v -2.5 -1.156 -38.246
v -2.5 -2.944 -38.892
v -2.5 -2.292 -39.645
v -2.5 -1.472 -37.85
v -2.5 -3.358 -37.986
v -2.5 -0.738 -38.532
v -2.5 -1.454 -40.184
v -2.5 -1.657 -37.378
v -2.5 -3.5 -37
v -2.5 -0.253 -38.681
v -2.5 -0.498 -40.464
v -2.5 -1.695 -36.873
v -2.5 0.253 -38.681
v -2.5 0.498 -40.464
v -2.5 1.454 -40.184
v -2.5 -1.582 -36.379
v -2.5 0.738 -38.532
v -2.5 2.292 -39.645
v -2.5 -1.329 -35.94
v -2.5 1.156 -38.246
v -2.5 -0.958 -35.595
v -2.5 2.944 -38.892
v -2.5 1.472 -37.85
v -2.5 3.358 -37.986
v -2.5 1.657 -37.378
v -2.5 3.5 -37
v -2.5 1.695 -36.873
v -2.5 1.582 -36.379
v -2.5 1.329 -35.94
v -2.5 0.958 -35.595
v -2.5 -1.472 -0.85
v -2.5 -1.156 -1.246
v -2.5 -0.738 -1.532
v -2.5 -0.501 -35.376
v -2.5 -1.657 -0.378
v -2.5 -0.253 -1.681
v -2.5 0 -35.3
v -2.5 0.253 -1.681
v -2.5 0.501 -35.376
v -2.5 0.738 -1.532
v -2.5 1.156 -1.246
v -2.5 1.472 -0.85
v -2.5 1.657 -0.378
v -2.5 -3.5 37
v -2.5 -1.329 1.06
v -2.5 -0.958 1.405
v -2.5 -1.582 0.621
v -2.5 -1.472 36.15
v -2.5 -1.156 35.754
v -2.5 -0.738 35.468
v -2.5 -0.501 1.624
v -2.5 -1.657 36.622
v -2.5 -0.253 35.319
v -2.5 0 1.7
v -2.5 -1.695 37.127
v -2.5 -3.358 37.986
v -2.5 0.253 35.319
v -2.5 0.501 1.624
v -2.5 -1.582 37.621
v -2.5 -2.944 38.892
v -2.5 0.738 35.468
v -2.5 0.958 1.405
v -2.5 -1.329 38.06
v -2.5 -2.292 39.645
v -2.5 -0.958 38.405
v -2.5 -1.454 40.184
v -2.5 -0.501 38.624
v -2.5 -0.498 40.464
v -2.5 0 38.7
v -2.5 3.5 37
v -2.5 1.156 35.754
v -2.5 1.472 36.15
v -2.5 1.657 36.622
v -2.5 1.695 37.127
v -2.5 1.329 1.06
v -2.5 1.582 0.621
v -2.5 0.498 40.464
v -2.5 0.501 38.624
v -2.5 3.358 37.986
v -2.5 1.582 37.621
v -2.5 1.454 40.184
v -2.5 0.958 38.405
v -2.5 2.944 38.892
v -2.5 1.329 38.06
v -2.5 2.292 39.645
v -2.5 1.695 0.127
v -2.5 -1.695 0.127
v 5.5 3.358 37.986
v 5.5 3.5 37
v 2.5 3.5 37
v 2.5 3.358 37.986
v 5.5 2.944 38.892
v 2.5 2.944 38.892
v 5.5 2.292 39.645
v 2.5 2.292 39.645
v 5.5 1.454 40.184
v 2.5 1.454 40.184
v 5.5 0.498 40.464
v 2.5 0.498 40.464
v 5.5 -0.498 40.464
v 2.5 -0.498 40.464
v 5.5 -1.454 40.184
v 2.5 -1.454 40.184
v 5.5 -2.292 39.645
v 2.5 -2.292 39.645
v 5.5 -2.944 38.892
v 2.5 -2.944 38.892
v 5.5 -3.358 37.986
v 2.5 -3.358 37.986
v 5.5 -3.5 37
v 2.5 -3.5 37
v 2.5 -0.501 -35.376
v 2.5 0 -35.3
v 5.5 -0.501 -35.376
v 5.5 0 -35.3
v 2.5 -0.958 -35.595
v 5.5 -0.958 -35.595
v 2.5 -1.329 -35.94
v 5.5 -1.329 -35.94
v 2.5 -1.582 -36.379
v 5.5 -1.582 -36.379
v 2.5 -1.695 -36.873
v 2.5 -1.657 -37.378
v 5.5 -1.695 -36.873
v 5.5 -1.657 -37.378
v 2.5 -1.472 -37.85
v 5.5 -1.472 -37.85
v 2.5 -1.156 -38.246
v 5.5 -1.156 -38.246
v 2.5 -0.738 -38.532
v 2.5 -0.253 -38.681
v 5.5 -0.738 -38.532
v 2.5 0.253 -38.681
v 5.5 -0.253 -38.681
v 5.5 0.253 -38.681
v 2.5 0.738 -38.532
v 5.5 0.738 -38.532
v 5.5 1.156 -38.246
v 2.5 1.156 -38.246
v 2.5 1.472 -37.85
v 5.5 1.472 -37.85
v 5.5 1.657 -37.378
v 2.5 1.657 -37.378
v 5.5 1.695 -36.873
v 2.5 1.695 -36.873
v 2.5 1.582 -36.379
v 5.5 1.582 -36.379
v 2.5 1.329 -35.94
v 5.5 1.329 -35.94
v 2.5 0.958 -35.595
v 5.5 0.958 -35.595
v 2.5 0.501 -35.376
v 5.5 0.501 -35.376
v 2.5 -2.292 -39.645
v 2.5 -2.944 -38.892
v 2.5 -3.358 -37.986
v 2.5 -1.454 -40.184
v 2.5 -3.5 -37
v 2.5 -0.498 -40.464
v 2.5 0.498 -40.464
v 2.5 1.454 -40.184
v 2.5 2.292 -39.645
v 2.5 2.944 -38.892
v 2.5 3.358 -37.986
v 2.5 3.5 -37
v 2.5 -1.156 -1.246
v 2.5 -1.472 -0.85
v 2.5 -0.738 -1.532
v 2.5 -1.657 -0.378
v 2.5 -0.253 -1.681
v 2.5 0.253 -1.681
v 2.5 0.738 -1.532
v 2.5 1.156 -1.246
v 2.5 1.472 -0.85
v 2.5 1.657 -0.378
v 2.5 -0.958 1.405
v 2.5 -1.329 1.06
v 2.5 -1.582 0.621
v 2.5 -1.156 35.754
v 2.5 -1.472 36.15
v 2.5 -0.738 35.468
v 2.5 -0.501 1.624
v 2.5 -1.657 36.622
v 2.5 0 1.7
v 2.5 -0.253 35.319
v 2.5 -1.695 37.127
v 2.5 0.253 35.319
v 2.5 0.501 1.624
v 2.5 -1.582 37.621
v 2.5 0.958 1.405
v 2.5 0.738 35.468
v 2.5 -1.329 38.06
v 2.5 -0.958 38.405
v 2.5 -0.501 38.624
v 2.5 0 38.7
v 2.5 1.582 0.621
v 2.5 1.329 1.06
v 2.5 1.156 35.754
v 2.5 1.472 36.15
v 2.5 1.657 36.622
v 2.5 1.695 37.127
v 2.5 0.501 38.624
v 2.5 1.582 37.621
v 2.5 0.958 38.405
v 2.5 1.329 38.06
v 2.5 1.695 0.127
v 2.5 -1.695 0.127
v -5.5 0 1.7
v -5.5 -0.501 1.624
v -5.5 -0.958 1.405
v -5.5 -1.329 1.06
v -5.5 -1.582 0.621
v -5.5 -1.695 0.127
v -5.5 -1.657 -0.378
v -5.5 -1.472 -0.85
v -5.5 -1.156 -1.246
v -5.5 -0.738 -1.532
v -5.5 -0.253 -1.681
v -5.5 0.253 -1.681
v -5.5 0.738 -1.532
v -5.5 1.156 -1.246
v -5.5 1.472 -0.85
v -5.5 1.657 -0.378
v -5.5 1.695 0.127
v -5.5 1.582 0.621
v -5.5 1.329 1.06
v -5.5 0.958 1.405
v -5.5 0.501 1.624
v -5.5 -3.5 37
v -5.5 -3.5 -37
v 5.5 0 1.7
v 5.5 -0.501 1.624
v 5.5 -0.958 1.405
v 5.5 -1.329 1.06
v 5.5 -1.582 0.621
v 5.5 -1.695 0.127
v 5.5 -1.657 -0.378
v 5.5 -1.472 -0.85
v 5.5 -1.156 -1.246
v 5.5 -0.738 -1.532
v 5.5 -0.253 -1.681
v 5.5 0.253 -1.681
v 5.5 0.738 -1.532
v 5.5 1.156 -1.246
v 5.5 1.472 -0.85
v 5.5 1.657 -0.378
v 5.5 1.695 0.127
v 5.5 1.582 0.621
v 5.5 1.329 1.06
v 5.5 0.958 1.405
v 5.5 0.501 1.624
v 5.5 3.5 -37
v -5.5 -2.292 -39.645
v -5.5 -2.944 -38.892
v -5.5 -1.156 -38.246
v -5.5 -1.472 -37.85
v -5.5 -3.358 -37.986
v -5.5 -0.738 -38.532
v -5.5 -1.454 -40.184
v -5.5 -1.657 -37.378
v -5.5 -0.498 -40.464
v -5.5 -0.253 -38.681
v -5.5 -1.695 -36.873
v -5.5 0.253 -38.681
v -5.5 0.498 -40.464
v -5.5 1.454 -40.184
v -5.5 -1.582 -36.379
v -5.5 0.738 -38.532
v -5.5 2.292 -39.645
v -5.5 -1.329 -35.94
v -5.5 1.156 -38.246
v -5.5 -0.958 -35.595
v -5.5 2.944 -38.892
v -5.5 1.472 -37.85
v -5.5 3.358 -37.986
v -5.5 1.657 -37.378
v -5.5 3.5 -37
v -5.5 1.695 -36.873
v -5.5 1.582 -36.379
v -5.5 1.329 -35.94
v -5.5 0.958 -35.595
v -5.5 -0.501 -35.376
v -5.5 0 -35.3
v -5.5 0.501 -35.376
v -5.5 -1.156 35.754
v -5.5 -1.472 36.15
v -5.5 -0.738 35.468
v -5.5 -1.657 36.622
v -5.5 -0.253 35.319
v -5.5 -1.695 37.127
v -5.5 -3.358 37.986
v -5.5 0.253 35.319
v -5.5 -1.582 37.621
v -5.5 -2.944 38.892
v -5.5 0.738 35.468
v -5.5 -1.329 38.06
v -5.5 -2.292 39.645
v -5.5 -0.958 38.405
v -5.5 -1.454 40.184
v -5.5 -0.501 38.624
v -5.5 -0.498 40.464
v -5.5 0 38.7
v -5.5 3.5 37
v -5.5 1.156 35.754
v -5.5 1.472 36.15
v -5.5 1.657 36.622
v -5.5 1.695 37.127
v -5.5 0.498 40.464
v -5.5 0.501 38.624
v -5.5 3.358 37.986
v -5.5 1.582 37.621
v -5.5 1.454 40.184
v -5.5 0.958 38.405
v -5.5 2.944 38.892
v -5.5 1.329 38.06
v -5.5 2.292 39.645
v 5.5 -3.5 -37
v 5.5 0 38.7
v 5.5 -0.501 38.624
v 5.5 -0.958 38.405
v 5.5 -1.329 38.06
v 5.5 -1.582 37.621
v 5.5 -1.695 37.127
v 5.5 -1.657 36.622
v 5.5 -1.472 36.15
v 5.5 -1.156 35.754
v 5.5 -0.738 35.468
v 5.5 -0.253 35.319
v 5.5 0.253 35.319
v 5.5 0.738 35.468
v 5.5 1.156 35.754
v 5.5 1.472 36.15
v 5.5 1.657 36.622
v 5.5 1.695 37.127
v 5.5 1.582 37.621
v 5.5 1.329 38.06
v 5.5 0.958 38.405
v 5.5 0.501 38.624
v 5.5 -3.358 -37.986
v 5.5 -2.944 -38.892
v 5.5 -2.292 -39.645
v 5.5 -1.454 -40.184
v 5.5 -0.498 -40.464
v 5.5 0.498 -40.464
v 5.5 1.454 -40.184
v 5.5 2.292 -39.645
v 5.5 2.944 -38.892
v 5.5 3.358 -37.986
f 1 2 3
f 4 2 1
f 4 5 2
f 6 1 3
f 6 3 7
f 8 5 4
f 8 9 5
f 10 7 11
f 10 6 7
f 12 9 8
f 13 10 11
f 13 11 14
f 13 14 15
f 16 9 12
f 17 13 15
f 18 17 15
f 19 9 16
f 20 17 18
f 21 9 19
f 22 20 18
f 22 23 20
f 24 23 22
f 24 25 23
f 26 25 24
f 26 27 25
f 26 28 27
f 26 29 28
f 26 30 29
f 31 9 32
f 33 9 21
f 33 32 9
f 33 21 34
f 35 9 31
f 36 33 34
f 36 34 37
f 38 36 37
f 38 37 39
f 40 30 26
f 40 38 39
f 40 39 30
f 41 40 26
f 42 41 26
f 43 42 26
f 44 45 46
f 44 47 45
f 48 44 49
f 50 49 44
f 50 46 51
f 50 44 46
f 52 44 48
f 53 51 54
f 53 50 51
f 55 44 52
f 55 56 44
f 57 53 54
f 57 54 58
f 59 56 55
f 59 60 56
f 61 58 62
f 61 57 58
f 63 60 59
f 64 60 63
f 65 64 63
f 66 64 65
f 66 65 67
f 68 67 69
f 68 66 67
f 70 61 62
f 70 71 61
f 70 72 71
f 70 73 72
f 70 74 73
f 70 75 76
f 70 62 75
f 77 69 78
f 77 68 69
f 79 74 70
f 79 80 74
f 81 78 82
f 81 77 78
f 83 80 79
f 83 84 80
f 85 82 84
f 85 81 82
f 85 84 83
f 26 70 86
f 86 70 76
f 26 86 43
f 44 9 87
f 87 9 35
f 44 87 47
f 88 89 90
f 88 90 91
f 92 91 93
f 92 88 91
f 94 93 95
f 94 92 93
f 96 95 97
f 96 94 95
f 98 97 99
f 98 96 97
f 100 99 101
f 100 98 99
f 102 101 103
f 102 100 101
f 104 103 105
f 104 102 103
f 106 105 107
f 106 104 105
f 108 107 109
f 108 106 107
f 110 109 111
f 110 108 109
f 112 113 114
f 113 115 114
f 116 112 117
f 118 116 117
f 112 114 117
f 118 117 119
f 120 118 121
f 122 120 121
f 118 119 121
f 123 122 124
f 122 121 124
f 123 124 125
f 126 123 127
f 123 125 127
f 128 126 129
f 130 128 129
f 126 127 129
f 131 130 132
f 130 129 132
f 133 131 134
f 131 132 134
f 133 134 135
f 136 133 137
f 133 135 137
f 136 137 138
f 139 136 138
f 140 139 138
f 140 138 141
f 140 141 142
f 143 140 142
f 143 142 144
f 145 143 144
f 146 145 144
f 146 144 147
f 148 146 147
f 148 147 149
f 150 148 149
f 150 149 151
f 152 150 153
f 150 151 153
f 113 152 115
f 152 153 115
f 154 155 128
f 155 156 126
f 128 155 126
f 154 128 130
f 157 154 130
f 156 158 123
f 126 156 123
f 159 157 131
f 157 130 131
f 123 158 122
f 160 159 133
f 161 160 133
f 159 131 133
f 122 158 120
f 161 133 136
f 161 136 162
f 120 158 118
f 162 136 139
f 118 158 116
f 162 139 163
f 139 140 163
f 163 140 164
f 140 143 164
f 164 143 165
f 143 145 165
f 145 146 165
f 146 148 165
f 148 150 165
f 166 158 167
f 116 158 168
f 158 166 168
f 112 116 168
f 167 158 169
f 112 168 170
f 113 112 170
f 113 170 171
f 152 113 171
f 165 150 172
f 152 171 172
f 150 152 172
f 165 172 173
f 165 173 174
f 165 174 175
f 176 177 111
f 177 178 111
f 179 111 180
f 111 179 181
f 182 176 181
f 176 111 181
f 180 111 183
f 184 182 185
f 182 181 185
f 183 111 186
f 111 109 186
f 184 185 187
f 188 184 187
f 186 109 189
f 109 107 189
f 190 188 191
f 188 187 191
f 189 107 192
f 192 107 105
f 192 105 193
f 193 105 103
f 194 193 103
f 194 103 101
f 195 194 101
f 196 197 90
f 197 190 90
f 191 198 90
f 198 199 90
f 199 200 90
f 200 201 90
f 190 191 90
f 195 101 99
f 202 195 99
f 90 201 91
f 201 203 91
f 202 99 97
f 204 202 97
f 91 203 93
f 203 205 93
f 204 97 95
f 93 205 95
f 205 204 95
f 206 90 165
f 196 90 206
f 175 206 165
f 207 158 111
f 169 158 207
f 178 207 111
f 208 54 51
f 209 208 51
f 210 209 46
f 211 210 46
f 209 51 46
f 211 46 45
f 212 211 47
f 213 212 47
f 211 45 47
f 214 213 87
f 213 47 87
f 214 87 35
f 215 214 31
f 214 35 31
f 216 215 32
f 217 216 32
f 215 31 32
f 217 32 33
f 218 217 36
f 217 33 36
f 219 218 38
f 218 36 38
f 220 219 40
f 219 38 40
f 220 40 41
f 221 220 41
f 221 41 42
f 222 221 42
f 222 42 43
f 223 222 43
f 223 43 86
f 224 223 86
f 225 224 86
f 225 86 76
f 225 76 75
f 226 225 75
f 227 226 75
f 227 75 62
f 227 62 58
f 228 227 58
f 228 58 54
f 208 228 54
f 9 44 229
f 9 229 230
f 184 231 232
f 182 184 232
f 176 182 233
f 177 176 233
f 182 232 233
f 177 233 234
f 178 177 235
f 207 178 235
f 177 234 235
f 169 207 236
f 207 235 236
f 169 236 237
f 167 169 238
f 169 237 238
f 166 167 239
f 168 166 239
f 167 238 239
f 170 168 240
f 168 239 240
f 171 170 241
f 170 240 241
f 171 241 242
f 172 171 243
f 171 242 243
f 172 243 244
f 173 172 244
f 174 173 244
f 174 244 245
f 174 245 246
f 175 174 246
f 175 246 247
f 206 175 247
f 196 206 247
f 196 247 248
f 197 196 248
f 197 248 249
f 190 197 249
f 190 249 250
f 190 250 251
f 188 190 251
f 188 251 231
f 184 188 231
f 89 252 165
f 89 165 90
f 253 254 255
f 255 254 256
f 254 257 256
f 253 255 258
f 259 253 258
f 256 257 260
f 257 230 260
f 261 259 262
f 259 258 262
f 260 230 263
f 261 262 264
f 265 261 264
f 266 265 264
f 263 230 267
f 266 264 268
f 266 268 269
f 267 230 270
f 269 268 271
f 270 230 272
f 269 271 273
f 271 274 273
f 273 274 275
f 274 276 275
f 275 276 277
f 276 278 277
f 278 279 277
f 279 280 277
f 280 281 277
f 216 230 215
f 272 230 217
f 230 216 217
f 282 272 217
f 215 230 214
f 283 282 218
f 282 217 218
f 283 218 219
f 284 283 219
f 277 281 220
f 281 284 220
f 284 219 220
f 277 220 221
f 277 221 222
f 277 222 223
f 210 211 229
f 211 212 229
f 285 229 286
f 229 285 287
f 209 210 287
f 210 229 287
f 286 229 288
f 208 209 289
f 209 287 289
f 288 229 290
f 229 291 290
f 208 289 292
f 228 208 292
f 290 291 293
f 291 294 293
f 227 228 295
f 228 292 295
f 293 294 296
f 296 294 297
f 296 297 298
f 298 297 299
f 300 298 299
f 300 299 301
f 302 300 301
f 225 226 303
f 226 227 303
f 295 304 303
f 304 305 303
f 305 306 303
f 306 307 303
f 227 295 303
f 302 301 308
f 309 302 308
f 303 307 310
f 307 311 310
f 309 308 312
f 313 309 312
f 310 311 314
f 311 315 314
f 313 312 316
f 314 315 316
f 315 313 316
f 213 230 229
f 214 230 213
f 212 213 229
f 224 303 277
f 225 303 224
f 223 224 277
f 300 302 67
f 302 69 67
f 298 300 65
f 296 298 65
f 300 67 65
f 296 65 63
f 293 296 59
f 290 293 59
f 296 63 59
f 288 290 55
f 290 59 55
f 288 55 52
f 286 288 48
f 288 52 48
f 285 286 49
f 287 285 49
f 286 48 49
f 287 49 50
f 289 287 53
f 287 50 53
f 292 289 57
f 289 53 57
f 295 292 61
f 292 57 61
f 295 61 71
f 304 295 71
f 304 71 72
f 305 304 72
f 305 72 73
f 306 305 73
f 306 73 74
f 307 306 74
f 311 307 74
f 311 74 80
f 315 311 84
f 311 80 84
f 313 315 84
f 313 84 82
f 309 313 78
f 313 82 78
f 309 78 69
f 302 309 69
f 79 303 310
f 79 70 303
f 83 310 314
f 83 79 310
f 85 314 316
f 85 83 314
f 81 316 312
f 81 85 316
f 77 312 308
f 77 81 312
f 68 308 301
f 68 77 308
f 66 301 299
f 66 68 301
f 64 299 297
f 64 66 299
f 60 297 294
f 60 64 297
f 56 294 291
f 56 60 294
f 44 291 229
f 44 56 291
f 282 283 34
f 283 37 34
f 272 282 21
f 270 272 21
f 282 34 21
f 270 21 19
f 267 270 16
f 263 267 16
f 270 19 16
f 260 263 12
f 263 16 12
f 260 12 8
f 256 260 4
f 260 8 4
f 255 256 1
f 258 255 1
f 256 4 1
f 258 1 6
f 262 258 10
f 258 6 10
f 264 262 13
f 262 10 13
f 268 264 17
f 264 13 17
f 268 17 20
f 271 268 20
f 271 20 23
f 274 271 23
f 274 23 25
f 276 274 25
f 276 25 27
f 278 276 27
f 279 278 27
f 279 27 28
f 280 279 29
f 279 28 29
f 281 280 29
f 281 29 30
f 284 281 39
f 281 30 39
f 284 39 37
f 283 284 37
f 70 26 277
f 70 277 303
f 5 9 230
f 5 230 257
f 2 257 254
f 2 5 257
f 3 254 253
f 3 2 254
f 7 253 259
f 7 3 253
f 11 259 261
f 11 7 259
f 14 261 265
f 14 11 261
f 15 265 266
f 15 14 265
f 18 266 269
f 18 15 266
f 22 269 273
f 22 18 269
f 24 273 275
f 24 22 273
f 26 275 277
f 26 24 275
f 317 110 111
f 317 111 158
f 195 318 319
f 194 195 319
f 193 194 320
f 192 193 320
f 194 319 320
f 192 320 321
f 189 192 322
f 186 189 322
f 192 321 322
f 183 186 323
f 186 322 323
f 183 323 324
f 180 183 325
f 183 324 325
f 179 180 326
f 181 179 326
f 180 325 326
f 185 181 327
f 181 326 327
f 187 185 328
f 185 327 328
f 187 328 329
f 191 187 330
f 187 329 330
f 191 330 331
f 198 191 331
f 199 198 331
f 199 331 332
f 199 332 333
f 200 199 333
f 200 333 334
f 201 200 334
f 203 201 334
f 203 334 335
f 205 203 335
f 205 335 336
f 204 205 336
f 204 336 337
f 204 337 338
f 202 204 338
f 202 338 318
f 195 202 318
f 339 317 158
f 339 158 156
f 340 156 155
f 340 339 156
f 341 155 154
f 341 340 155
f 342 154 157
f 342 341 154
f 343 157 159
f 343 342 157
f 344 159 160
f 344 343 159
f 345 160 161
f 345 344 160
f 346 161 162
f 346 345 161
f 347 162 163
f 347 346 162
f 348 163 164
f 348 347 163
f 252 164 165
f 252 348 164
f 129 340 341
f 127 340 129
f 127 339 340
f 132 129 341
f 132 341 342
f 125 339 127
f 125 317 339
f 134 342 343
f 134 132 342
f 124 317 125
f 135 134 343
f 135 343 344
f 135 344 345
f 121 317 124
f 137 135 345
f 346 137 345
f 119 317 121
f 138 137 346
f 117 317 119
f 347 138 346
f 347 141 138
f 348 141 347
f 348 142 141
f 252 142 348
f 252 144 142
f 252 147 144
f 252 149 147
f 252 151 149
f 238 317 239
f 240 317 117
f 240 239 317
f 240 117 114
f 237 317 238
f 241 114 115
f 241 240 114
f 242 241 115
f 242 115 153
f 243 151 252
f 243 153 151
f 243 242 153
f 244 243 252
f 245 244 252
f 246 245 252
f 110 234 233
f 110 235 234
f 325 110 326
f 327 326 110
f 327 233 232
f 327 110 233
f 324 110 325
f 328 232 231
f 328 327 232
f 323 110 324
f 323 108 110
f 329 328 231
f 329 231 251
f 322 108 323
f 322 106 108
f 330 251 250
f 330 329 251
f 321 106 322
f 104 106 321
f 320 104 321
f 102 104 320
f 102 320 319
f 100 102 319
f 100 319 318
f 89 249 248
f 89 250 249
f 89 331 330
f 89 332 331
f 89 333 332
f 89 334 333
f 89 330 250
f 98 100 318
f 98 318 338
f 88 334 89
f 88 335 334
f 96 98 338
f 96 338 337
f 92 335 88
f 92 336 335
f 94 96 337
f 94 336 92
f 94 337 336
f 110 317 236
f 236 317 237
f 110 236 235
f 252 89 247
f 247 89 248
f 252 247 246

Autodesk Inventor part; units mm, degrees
ref_plane "YZ Plane" through (0, 0, 0) normal (1, 0, 0) x (0, 1, 0)
ref_plane "XZ Plane" through (0, 0, 0) normal (0, 1, 0) x (-1, 0, 0)
ref_plane "XY Plane" through (0, 0, 0) normal (0, 0, 1) x (1, 0, 0)
sketch "Sketch1" plane through (0, 0, 0) normal (1, 0, 0) x (0, 1, 0)
  line L0 (0, 37) -> (0, -37) construction
  line L1 (-3.5, 37) -> (-3.5, -37)
  line L2 (3.5, -37) -> (3.5, 37)
  arc A0 (3.5, 37) -> (-3.5, 37) centre (0, 37) ccw
  arc A1 (-3.5, -37) -> (3.5, -37) centre (0, -37) ccw
  circle A2 centre (0, -37) radius 1.5
  circle A3 centre (0, 37) radius 1.5
  circle A4 centre (0, 0) radius 1.5
  point P0 (0, 40.5)
  point P1 (0, -40.5)
  dimension "d14" = 7
  dimension "d15" = 81
  dimension "d16" = 3
  dimension "d29" = 0
extrude "Extrusión3" add sketch "Sketch1" along normal mid plane 11 contours A0 L2 A1 L1 | A2 | A3 | A4
extrude "Extrusión4" cut sketch "Sketch1" along normal mid plane 5 contours A0 L2 A1 L1 | A4
sketch "Boceto2" plane through (-5.5, 0, 0) normal (-1, 0, 0) x (0, 0, 1)
  circle A0 centre (37, 0) radius 1.5 projected
  circle A1 centre (-37, 0) radius 1.5 projected
  point P0 (0, 0)
  point P1 (0, 0)
hole "Agujero1" at (-5.5, 0, 37) at (-5.5, 0, -37) at (-5.5, 0, 0) direction (1, 0, 0) diameter 3.4 end through all clearance for "Tornillo de cabeza plana avellanada ISO 2009/7046" size "M3" standard "ISO"
sketch "Boceto3" plane through (-5.5, 0, 0) normal (-1, 0, 0) x (0, 0, 1)
  point P0 (37, 0)
hole "Agujero2" at (-5.5, 0, 37) direction (1, 0, 0) diameter 3.4 depth 3
sketch "Boceto4" plane through (5.5, 0, 0) normal (1, 0, 0) x (0, 0, -1)
  point P0 (-37, 0)
hole "Agujero3" at (5.5, 0, 37) direction (-1, 0, 0) diameter 3.4 depth 3
properties part number "Corredera I" material "Aluminum 7075"
